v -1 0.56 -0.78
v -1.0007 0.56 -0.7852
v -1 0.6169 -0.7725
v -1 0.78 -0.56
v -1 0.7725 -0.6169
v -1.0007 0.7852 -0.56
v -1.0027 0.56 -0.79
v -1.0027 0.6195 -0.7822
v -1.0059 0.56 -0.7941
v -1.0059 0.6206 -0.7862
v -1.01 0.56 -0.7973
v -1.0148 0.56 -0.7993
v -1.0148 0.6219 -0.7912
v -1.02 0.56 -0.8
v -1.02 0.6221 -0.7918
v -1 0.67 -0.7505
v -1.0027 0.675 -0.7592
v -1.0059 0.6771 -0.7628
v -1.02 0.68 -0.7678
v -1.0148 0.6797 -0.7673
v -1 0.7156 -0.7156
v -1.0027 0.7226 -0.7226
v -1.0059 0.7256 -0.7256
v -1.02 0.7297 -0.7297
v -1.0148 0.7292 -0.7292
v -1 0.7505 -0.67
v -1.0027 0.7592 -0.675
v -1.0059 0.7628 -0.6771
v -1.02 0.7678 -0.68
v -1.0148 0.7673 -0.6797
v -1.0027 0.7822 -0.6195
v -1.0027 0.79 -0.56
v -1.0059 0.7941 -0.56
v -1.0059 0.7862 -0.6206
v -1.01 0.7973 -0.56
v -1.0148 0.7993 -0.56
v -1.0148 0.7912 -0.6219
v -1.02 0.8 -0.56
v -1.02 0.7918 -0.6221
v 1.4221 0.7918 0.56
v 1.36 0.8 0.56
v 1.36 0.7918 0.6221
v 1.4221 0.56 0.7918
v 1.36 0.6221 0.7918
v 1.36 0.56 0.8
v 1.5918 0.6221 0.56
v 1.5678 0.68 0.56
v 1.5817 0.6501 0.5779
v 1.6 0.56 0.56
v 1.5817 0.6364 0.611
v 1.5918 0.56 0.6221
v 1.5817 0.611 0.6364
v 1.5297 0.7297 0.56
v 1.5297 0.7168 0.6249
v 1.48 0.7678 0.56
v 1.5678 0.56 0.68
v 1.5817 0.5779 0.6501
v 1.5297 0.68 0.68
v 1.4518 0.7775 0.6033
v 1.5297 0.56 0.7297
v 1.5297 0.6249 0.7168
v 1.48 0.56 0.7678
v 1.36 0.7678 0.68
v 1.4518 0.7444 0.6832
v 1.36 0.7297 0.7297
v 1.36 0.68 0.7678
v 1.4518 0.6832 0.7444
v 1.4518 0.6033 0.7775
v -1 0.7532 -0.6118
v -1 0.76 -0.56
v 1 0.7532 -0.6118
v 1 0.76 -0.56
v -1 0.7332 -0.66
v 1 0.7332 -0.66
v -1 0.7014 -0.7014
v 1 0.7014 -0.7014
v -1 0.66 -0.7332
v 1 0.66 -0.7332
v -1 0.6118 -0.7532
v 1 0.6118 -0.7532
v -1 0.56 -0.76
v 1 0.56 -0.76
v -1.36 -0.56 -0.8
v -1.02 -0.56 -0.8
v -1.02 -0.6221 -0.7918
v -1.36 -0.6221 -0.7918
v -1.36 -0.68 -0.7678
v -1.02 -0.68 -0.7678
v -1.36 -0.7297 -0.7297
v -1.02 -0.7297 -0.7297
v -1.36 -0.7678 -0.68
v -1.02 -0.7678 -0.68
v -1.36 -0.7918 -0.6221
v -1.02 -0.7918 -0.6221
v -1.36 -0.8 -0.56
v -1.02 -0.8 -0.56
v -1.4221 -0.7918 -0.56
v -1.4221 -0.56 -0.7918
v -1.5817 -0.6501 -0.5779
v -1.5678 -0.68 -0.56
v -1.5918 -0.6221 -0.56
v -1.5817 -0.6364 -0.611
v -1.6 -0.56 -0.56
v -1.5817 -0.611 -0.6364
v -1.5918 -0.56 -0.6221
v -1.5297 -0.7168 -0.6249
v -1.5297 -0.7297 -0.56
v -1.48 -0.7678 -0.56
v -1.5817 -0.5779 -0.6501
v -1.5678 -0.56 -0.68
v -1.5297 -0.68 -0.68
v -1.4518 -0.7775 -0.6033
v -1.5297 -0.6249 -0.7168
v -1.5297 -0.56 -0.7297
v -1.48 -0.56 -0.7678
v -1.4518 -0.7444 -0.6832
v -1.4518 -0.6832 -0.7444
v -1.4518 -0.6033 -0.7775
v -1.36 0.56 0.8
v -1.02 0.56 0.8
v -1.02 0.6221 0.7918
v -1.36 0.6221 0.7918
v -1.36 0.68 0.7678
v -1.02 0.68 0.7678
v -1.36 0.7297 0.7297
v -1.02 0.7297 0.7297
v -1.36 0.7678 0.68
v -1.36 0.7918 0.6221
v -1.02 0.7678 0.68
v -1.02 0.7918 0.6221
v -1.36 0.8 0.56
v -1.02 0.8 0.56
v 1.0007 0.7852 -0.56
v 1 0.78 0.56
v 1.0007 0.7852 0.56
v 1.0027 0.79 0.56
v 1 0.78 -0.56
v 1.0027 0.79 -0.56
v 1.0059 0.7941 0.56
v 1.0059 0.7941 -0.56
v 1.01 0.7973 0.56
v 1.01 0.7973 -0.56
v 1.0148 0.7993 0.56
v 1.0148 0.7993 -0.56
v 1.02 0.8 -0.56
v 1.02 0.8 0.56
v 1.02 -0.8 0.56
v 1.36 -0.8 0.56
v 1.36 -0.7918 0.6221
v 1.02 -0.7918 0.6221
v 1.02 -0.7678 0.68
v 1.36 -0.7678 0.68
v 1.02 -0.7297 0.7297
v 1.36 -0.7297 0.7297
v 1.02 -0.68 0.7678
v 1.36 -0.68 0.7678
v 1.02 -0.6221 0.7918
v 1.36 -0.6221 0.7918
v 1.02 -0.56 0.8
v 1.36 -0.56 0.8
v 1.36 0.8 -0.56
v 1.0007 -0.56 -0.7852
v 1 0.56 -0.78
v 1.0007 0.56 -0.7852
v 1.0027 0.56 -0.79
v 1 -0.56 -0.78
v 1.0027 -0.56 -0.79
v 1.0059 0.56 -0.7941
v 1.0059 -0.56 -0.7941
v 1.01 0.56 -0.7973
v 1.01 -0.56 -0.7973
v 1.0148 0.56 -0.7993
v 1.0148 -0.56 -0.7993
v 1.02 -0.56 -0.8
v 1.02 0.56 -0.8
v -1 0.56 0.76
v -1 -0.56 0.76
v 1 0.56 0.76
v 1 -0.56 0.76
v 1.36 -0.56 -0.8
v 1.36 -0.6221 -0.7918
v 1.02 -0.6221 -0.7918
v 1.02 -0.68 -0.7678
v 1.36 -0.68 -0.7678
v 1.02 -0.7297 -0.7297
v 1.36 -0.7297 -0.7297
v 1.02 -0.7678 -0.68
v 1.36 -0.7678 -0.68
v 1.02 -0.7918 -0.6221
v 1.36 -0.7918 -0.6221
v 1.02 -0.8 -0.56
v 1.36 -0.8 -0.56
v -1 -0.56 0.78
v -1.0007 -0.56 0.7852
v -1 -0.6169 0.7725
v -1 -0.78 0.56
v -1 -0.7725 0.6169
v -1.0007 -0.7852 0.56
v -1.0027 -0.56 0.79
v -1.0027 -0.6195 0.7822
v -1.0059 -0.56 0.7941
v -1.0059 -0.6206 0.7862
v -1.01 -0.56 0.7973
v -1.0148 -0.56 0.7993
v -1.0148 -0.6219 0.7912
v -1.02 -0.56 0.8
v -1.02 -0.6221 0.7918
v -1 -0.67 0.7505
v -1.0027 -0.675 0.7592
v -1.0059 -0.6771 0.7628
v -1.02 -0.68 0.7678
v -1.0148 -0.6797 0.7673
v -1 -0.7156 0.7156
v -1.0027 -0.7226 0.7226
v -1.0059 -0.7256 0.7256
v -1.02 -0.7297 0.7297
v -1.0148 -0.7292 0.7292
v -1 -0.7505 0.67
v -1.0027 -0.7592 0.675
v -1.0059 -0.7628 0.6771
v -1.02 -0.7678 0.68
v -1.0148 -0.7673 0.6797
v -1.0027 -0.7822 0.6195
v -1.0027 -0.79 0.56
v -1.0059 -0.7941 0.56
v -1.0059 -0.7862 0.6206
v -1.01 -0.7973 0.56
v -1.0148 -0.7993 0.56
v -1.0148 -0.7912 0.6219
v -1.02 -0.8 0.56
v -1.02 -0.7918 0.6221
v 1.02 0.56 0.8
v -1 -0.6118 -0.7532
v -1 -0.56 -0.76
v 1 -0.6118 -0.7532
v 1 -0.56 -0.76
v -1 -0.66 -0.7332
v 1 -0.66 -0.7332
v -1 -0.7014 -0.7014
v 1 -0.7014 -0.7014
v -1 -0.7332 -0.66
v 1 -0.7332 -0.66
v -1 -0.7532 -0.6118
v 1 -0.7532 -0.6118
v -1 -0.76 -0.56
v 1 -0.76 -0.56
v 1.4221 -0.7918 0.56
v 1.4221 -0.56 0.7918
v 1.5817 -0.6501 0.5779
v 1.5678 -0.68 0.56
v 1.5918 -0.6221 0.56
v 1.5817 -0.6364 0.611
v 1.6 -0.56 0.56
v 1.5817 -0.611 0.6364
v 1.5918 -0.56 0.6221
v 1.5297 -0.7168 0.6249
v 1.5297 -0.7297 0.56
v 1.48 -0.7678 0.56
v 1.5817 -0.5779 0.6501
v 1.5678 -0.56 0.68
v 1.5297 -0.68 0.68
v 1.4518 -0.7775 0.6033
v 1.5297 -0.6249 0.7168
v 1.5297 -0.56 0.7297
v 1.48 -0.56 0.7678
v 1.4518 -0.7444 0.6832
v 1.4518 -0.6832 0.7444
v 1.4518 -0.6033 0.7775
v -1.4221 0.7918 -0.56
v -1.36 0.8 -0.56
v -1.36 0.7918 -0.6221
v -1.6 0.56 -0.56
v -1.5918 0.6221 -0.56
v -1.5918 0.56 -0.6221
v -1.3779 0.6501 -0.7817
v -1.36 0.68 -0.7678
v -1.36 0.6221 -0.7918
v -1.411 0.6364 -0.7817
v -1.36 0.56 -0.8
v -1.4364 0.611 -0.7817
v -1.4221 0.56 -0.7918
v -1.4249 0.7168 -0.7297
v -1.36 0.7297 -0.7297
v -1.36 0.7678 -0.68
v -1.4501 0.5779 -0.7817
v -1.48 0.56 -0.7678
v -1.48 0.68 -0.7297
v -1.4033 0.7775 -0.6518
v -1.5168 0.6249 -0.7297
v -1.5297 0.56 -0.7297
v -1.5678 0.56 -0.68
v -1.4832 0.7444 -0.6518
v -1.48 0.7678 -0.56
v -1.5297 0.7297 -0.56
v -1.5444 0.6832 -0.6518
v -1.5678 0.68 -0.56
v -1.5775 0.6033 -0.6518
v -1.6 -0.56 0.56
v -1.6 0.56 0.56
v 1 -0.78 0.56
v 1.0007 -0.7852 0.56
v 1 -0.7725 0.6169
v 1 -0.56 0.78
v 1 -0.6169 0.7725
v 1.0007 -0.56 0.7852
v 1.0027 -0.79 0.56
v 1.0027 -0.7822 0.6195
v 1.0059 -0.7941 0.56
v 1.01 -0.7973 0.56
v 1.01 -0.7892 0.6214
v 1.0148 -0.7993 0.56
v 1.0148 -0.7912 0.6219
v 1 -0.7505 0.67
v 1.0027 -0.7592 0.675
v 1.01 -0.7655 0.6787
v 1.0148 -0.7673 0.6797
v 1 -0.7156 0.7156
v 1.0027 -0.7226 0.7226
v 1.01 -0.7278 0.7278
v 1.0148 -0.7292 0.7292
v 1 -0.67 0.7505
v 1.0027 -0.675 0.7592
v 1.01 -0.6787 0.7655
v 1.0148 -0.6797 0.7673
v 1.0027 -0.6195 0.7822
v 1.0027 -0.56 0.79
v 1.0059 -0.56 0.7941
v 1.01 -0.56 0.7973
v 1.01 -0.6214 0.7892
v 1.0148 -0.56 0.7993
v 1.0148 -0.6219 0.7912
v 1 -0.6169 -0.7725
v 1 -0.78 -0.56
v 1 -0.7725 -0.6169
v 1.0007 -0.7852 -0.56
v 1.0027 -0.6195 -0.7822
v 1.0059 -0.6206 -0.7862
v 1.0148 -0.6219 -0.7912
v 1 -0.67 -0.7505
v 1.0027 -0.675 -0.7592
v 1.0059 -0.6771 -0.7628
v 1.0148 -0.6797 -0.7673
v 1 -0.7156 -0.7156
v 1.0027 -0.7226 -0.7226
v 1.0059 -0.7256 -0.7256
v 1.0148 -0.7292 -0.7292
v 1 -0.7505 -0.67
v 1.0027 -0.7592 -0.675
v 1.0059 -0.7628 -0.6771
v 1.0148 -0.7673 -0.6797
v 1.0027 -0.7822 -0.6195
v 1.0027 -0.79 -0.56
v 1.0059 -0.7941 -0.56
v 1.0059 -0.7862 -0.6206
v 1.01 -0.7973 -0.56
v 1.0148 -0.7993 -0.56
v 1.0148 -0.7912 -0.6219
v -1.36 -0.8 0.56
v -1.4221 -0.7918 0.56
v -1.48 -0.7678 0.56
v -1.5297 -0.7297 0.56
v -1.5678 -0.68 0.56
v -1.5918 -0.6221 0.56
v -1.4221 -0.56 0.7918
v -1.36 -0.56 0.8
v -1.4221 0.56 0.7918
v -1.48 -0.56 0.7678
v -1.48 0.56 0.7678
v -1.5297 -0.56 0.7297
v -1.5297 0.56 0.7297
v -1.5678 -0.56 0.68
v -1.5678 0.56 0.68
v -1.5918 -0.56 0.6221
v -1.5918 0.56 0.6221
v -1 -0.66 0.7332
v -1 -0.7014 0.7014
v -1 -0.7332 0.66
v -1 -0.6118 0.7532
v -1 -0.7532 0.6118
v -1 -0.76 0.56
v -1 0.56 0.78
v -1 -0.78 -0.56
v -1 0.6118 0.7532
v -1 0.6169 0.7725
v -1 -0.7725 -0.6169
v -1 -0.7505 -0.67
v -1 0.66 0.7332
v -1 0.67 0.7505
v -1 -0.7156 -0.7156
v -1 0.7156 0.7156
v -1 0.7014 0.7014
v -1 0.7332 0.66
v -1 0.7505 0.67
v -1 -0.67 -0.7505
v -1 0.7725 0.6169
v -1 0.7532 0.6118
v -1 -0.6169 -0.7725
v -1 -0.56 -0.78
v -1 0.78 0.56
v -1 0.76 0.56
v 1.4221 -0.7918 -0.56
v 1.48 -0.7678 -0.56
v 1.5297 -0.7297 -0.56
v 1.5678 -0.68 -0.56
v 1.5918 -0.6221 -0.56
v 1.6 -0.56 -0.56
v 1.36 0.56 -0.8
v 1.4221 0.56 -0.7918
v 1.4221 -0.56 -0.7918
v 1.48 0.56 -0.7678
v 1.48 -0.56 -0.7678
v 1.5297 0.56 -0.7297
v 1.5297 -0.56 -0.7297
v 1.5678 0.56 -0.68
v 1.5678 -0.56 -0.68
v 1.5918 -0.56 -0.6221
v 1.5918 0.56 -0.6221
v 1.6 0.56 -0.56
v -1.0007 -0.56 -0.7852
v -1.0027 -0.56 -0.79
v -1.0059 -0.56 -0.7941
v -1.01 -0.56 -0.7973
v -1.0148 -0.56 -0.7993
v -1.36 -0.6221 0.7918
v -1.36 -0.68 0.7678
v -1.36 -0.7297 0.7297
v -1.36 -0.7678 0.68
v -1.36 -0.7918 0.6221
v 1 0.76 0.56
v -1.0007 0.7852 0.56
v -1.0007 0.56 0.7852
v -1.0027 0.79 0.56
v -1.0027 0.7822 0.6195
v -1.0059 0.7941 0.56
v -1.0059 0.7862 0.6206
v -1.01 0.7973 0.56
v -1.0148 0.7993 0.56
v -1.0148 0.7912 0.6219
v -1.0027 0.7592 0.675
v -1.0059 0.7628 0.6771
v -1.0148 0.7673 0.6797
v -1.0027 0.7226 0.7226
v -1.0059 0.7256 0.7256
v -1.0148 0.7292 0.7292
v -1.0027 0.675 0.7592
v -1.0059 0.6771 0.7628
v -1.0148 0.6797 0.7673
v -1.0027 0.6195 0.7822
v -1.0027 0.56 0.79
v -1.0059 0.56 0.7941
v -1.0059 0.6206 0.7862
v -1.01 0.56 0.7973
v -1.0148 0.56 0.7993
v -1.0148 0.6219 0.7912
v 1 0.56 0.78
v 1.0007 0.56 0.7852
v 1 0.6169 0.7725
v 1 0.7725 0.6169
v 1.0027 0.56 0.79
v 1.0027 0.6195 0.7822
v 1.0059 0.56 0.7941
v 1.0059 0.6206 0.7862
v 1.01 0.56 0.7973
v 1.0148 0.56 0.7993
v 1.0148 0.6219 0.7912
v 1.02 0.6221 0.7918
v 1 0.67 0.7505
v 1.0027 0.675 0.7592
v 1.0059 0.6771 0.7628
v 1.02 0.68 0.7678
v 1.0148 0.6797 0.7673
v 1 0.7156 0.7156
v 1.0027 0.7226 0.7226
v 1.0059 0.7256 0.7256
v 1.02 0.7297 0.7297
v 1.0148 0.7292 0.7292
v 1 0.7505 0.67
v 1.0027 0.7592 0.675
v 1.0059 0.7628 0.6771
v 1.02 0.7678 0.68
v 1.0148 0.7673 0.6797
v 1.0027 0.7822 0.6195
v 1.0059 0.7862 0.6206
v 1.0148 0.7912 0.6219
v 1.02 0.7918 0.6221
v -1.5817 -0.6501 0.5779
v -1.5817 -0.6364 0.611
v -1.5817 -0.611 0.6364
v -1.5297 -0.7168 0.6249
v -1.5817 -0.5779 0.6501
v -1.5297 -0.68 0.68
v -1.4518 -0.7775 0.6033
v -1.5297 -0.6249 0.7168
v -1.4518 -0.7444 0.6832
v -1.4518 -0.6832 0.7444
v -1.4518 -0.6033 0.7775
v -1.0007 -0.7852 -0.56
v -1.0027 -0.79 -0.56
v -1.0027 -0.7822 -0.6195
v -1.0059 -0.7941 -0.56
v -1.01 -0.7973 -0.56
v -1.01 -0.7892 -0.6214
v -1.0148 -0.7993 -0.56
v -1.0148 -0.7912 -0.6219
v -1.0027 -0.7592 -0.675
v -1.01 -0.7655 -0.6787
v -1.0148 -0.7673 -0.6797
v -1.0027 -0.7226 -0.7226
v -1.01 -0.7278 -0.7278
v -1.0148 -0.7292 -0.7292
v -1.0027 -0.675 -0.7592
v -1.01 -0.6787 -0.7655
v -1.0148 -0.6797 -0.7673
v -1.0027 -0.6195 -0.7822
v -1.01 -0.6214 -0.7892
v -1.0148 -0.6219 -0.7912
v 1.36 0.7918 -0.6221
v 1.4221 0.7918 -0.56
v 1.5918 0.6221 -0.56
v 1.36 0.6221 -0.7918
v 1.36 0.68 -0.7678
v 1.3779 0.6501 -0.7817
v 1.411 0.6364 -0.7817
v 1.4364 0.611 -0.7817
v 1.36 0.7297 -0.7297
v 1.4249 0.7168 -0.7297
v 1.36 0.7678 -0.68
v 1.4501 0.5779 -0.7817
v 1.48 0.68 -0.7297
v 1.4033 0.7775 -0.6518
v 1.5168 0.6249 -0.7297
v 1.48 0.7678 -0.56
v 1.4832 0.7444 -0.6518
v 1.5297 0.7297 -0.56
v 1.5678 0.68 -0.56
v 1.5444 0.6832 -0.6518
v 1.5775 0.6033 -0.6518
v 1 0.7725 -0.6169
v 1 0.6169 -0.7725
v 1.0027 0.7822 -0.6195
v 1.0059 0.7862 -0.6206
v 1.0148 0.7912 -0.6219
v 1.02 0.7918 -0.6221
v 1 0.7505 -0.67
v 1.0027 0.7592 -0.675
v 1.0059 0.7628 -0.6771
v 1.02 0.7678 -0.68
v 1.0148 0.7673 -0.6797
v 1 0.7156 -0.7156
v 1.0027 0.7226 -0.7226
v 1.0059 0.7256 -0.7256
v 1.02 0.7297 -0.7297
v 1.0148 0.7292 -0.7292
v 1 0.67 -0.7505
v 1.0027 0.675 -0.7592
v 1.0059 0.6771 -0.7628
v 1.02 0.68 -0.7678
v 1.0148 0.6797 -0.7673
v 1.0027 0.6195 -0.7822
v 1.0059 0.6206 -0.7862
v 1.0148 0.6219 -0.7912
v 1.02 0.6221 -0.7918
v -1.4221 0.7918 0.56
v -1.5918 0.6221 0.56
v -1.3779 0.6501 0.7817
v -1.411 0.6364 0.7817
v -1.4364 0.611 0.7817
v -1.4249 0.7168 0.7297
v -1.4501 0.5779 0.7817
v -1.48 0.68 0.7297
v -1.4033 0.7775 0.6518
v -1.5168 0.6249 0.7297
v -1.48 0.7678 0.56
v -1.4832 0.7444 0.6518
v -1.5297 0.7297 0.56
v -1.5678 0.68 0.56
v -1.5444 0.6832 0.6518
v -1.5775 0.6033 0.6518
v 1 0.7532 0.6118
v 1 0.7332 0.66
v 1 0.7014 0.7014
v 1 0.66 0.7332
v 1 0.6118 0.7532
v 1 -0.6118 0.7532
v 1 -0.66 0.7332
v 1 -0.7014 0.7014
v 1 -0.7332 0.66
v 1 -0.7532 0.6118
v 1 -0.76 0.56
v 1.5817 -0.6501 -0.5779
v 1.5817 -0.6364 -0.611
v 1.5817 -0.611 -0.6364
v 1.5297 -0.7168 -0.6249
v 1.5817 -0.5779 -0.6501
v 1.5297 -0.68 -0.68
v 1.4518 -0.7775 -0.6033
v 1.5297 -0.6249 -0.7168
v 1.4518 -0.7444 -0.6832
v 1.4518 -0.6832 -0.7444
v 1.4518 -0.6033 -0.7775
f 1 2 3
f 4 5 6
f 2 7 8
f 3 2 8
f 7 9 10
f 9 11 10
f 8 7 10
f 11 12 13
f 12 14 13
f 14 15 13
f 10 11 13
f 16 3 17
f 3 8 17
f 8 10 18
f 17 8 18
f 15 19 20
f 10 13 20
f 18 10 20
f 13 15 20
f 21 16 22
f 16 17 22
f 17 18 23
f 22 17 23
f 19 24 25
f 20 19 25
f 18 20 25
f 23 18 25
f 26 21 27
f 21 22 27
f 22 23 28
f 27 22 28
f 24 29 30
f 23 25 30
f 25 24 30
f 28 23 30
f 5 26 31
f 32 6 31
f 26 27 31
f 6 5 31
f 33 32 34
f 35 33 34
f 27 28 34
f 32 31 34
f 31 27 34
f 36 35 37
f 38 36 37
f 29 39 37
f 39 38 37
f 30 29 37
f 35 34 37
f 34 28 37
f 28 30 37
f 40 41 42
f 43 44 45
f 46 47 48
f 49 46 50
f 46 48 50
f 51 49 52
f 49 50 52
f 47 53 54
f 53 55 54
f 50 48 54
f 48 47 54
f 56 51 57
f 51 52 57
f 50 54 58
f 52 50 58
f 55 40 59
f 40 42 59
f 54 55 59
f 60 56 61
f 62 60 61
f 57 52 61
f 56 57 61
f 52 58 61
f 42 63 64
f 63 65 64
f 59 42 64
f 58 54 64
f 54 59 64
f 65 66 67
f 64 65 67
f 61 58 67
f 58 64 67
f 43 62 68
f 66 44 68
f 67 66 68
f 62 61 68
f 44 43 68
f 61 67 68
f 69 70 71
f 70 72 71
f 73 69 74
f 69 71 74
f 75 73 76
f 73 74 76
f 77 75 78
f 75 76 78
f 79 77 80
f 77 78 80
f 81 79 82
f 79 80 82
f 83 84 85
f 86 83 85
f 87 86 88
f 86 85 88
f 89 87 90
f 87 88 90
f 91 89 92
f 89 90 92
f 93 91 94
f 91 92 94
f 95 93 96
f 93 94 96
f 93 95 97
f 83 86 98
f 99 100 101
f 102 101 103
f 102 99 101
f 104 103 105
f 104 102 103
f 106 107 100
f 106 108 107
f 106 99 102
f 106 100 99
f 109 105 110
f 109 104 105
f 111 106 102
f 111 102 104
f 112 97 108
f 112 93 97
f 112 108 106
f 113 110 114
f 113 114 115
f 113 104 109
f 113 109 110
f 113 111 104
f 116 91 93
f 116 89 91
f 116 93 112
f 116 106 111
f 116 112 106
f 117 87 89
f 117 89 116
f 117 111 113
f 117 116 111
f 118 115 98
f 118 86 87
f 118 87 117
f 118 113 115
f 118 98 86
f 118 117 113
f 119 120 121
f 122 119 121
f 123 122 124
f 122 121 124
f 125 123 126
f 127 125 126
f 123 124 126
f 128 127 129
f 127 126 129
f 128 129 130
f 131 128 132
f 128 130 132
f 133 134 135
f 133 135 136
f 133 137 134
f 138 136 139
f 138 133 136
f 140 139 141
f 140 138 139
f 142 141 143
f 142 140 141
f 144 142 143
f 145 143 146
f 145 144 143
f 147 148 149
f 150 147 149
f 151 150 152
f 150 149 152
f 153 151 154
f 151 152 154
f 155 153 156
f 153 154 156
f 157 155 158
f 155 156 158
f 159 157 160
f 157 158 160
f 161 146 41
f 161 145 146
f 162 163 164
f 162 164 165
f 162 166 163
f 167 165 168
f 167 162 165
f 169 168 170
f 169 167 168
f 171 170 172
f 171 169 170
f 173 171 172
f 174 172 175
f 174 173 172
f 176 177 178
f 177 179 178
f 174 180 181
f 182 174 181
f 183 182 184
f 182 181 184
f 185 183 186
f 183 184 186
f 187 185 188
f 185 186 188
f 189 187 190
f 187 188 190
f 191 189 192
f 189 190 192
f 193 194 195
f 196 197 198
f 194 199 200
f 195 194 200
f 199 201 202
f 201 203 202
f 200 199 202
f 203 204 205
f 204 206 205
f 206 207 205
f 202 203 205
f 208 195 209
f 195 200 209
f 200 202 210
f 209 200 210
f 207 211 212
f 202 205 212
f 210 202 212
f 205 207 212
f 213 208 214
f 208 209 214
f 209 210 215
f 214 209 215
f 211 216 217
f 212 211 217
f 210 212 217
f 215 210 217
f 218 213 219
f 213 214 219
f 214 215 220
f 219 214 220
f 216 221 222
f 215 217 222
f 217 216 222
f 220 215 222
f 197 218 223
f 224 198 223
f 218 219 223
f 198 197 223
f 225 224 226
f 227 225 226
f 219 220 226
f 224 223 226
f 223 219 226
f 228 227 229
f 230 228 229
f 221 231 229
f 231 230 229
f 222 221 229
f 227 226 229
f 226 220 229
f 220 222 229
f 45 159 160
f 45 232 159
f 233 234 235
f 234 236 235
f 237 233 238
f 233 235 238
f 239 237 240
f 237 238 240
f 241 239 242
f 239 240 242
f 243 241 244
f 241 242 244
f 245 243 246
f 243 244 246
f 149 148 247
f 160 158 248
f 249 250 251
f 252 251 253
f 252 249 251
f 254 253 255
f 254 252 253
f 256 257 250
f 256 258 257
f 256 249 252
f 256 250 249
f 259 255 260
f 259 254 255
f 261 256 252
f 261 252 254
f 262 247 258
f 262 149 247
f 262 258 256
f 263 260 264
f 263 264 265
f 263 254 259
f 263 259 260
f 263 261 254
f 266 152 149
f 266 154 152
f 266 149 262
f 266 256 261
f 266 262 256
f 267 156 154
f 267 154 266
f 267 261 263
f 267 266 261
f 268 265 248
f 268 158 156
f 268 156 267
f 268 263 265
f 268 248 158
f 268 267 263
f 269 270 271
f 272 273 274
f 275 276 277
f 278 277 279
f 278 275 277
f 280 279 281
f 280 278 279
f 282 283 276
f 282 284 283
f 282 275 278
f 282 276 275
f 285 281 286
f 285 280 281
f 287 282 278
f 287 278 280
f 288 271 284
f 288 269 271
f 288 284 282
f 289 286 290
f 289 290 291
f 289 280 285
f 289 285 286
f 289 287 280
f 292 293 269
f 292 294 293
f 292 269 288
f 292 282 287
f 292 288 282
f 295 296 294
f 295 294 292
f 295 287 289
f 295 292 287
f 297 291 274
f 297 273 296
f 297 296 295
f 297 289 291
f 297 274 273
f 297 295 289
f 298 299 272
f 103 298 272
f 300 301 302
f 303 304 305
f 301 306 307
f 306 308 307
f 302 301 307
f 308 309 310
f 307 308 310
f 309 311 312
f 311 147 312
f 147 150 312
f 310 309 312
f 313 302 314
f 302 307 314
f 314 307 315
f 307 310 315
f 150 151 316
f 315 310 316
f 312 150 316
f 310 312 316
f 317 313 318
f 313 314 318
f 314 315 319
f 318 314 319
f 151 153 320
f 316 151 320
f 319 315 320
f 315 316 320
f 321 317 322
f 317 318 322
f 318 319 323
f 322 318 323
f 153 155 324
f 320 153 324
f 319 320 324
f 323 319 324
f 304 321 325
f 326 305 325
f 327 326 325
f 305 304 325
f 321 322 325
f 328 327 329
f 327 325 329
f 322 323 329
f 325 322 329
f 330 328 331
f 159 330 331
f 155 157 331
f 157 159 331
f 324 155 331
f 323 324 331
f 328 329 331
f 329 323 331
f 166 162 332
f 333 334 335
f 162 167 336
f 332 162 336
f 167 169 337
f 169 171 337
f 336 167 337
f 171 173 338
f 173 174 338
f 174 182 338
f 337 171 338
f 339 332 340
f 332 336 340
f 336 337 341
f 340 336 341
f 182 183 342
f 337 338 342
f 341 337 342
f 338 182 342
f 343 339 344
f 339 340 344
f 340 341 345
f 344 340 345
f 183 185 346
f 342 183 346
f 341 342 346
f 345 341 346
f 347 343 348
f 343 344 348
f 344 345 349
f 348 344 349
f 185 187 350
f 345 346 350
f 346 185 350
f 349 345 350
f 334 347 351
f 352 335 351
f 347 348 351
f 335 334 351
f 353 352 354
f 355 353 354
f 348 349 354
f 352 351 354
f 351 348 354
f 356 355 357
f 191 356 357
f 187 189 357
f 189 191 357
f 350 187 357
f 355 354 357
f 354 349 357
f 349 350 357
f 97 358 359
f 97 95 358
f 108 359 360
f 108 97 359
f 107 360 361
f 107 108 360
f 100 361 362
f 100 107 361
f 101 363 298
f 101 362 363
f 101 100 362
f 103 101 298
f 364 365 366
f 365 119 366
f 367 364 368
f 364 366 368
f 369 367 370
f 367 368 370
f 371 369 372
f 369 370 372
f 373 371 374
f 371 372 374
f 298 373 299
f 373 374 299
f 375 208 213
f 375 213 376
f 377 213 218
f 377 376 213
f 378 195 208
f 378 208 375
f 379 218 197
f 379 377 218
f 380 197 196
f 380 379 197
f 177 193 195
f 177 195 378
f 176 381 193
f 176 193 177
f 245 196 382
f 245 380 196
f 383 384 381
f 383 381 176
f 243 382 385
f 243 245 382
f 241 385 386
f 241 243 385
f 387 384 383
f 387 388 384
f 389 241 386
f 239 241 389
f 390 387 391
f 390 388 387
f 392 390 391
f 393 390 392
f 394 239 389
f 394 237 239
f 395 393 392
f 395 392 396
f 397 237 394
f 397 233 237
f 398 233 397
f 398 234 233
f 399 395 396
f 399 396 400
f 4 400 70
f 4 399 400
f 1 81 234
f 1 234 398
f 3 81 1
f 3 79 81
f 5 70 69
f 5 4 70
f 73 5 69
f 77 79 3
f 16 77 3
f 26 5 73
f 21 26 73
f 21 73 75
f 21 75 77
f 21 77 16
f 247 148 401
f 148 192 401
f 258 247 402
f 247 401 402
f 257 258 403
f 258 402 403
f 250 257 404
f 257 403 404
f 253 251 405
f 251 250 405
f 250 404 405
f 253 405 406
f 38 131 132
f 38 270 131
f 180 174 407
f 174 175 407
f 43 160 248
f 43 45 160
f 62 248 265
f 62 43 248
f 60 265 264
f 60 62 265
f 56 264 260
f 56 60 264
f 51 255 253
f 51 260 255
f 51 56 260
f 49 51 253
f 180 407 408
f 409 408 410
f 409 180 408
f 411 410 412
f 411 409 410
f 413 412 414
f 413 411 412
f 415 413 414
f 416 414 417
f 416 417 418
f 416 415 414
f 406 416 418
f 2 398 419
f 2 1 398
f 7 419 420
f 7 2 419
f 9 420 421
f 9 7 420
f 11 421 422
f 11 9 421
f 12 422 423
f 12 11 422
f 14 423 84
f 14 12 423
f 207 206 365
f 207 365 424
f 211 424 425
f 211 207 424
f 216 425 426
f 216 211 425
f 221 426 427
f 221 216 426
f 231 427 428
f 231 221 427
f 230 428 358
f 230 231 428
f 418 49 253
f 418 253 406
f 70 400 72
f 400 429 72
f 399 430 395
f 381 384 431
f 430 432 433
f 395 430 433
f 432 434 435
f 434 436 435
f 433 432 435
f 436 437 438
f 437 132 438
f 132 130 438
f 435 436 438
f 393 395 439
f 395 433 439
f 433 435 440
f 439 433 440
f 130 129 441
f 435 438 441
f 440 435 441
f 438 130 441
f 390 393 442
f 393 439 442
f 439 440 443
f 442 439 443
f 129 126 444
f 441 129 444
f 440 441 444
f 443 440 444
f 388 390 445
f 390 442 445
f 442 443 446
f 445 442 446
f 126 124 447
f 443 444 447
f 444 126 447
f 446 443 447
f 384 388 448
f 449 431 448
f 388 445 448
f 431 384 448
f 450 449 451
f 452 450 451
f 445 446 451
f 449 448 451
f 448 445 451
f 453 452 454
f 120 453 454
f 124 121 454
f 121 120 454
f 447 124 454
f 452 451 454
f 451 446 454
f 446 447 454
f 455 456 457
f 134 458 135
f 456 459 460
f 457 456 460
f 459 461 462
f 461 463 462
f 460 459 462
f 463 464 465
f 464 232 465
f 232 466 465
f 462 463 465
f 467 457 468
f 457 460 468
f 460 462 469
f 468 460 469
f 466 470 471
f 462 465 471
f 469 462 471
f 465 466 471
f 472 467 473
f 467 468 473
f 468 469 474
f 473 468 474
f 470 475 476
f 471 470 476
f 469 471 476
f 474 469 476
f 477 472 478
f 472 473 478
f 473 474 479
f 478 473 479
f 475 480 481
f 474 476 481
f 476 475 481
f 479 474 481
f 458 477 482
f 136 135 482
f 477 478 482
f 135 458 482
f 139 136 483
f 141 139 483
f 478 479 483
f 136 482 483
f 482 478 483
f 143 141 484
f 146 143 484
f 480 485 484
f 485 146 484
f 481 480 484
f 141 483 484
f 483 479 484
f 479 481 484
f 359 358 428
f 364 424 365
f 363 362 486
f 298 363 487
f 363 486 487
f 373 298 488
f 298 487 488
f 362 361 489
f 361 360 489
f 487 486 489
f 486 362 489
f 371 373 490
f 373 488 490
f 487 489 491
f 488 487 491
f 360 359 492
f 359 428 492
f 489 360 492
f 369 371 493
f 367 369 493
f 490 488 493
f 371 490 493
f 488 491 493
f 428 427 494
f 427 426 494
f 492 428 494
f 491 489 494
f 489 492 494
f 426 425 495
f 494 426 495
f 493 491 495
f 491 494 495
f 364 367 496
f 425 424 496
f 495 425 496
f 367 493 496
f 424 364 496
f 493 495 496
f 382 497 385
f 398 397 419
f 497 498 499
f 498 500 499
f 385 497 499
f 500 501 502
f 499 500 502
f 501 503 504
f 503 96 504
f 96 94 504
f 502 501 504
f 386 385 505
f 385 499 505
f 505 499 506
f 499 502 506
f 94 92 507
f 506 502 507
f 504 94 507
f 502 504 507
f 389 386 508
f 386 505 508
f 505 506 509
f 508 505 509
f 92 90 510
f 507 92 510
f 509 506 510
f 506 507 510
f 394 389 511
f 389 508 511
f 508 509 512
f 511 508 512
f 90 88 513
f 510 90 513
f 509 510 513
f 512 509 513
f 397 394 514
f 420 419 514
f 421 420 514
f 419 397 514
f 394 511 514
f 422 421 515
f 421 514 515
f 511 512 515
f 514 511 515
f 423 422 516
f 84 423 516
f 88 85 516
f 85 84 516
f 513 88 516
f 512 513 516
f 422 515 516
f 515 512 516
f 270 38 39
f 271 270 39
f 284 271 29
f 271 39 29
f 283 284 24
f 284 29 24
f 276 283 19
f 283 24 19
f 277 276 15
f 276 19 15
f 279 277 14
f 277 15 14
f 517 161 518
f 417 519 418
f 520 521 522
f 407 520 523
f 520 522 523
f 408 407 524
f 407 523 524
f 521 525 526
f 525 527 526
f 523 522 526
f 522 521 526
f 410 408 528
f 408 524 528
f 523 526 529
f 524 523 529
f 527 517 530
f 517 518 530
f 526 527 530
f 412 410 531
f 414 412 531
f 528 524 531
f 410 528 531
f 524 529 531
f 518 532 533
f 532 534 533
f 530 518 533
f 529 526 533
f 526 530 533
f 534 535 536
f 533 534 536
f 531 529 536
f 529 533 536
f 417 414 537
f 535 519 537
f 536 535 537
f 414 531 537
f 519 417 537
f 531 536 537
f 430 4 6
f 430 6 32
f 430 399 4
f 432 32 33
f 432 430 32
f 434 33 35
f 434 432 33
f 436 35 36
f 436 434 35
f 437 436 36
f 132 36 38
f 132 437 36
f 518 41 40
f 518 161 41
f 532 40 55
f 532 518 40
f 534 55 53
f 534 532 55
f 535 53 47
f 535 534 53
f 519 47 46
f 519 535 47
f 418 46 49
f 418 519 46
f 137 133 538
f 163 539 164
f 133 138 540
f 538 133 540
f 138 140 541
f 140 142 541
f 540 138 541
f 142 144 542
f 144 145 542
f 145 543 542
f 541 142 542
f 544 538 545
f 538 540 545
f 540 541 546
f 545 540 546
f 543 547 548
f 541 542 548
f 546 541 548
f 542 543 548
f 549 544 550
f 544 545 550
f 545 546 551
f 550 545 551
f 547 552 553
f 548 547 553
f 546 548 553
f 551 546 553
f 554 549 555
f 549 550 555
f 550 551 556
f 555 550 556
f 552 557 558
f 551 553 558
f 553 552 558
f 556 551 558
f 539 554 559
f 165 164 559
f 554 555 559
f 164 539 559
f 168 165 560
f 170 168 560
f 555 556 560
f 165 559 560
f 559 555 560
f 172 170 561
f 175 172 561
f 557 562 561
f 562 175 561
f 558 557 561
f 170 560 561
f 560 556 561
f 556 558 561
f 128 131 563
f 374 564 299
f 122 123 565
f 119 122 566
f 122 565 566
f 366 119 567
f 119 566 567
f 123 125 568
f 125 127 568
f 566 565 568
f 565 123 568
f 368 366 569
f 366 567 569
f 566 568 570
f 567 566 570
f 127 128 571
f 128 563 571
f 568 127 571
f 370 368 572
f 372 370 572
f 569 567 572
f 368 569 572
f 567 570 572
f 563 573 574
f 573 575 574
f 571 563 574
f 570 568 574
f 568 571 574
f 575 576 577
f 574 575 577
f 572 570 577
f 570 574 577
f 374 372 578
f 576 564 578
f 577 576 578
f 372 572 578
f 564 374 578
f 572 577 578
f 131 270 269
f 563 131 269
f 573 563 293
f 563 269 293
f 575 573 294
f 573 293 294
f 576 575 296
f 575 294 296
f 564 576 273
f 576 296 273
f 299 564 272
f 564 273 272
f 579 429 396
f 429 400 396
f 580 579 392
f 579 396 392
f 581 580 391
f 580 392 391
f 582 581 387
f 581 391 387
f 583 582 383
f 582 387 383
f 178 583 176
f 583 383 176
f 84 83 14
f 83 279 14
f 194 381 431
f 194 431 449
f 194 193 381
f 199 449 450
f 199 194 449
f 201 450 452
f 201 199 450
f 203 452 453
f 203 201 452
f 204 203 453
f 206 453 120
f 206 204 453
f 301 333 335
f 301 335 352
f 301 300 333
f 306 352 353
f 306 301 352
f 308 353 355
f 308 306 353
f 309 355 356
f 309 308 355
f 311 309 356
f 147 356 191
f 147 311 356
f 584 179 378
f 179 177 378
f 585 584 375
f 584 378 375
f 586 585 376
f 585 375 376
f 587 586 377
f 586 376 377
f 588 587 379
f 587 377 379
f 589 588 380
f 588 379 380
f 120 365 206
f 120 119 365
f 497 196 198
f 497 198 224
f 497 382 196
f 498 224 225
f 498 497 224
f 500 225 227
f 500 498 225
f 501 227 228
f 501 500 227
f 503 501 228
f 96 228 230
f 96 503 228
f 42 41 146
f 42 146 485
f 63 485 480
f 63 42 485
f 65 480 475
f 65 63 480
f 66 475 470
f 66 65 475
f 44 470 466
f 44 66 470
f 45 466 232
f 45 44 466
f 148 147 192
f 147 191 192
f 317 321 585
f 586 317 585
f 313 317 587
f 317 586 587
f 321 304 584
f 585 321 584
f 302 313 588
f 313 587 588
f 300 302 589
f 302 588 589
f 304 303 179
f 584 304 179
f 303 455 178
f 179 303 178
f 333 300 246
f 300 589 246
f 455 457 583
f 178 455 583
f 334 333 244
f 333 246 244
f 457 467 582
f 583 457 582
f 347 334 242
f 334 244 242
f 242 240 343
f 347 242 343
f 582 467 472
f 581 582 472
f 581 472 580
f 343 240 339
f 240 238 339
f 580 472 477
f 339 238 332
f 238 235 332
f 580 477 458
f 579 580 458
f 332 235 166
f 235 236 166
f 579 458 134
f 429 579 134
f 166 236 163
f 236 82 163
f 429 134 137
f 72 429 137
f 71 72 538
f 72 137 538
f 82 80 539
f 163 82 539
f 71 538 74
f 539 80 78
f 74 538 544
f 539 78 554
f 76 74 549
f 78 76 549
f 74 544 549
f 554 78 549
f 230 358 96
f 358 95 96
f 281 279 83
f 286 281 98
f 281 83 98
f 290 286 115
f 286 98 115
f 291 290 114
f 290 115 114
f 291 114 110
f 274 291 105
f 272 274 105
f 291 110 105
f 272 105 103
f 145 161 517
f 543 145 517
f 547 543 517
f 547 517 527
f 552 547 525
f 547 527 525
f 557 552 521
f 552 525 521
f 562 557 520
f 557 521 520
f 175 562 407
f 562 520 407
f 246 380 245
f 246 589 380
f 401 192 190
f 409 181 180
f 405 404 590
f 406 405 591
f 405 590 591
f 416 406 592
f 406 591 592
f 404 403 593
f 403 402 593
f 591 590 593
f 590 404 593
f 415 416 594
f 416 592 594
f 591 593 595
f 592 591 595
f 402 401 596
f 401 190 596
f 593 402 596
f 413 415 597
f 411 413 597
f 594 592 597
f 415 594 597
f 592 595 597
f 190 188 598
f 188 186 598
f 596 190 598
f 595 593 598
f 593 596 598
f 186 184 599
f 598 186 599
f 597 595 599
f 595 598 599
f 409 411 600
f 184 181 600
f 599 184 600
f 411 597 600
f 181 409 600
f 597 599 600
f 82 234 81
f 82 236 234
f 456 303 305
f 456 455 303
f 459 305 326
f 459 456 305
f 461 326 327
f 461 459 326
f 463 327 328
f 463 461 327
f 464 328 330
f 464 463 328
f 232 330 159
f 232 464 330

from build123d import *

# Parameters (mm, degrees)
SKETCH1_W               = 3.2
SKETCH1_H               = 1.6
BOSS_EXTRUDE1_DEPTH     = 0.8
SKETCH3_OUTSIDE_W       = 4.384
SKETCH3_OUTSIDE_H       = 4.384
SKETCH3_OUTSIDE_W_2     = 1.52
SKETCH3_OUTSIDE_H_2     = 1.52
CUT_EXTRUDE1_DEPTH      = 1
CUT_EXTRUDE1_DEPTH_BACK = 1
FILLET1_R               = 0.2
FILLET2_R               = 0.24
FILLET3_R               = 0.02


with BuildPart() as part:
    # Sketch1 → Boss-Extrude1 (new body, symmetric)
    with BuildSketch(Plane(origin=(0, 0, 0), x_dir=(1, 0, 0), z_dir=(0, 1, 0))):
        Rectangle(SKETCH1_W, SKETCH1_H)
    extrude(amount=BOSS_EXTRUDE1_DEPTH, both=True)

    # Sketch3 outside → Cut-Extrude1 (cut, two sides)
    with BuildSketch(Plane(origin=(0, 0, 0), x_dir=(0, 0, -1), z_dir=(1, 0, 0))) as cut_extrude1_sk:
        Rectangle(SKETCH3_OUTSIDE_W, SKETCH3_OUTSIDE_H)
        Rectangle(SKETCH3_OUTSIDE_W_2, SKETCH3_OUTSIDE_H_2, mode=Mode.SUBTRACT)
    extrude(amount=CUT_EXTRUDE1_DEPTH, mode=Mode.SUBTRACT)
    extrude(cut_extrude1_sk.sketch, amount=-CUT_EXTRUDE1_DEPTH_BACK, mode=Mode.SUBTRACT)

    # Fillet1
    fillet1_edges = [part.edges().sort_by_distance(p)[0] for p in [
        (0, -0.76, 0.76),
        (0, -0.76, -0.76),
        (0, 0.76, -0.76),
        (0, 0.76, 0.76),
    ]]
    fillet(fillet1_edges, radius=FILLET1_R)

    # Fillet2
    fillet2_edges = [part.edges().sort_by_distance(p)[0] for p in [
        (-1.6, 0.8, 0),
        (-1.3, 0.8, 0.8),
        (1.3, -0.8, 0.8),
        (-1.3, -0.8, -0.8),
        (-1.3, 0.8, -0.8),
        (1.3, 0.8, 0.8),
        (1.6, 0.8, 0),
        (-1.3, -0.8, 0.8),
        (-1.6, -0.8, 0),
        (1.3, -0.8, -0.8),
        (1.6, -0.8, 0),
        (1.3, 0.8, -0.8),
        (1.6, 0, 0.8),
        (-1.6, 0, 0.8),
        (-1.6, 0, -0.8),
        (1.6, 0, -0.8),
    ]]
    fillet(fillet2_edges, radius=FILLET2_R)

    # Fillet3
    fillet3_edges = [part.edges().sort_by_distance(p)[0] for p in [
        (1, 0, 0.8),
        (1, 0.8, 0),
        (1, 0, -0.8),
        (1, -0.8, 0),
        (-1, 0, -0.8),
        (-1, 0.8, 0),
        (-1, 0, 0.8),
        (-1, -0.8, 0),
        (-1, 0.729705627, -0.729705627),
        (-1, -0.729705627, -0.729705627),
        (-1, 0.729705627, 0.729705627),
        (-1, -0.729705627, 0.729705627),
        (1, -0.729705627, -0.729705627),
        (1, 0.729705627, -0.729705627),
        (1, -0.729705627, 0.729705627),
        (1, 0.729705627, 0.729705627),
    ]]
    fillet(fillet3_edges, radius=FILLET3_R)


solid = part.part
